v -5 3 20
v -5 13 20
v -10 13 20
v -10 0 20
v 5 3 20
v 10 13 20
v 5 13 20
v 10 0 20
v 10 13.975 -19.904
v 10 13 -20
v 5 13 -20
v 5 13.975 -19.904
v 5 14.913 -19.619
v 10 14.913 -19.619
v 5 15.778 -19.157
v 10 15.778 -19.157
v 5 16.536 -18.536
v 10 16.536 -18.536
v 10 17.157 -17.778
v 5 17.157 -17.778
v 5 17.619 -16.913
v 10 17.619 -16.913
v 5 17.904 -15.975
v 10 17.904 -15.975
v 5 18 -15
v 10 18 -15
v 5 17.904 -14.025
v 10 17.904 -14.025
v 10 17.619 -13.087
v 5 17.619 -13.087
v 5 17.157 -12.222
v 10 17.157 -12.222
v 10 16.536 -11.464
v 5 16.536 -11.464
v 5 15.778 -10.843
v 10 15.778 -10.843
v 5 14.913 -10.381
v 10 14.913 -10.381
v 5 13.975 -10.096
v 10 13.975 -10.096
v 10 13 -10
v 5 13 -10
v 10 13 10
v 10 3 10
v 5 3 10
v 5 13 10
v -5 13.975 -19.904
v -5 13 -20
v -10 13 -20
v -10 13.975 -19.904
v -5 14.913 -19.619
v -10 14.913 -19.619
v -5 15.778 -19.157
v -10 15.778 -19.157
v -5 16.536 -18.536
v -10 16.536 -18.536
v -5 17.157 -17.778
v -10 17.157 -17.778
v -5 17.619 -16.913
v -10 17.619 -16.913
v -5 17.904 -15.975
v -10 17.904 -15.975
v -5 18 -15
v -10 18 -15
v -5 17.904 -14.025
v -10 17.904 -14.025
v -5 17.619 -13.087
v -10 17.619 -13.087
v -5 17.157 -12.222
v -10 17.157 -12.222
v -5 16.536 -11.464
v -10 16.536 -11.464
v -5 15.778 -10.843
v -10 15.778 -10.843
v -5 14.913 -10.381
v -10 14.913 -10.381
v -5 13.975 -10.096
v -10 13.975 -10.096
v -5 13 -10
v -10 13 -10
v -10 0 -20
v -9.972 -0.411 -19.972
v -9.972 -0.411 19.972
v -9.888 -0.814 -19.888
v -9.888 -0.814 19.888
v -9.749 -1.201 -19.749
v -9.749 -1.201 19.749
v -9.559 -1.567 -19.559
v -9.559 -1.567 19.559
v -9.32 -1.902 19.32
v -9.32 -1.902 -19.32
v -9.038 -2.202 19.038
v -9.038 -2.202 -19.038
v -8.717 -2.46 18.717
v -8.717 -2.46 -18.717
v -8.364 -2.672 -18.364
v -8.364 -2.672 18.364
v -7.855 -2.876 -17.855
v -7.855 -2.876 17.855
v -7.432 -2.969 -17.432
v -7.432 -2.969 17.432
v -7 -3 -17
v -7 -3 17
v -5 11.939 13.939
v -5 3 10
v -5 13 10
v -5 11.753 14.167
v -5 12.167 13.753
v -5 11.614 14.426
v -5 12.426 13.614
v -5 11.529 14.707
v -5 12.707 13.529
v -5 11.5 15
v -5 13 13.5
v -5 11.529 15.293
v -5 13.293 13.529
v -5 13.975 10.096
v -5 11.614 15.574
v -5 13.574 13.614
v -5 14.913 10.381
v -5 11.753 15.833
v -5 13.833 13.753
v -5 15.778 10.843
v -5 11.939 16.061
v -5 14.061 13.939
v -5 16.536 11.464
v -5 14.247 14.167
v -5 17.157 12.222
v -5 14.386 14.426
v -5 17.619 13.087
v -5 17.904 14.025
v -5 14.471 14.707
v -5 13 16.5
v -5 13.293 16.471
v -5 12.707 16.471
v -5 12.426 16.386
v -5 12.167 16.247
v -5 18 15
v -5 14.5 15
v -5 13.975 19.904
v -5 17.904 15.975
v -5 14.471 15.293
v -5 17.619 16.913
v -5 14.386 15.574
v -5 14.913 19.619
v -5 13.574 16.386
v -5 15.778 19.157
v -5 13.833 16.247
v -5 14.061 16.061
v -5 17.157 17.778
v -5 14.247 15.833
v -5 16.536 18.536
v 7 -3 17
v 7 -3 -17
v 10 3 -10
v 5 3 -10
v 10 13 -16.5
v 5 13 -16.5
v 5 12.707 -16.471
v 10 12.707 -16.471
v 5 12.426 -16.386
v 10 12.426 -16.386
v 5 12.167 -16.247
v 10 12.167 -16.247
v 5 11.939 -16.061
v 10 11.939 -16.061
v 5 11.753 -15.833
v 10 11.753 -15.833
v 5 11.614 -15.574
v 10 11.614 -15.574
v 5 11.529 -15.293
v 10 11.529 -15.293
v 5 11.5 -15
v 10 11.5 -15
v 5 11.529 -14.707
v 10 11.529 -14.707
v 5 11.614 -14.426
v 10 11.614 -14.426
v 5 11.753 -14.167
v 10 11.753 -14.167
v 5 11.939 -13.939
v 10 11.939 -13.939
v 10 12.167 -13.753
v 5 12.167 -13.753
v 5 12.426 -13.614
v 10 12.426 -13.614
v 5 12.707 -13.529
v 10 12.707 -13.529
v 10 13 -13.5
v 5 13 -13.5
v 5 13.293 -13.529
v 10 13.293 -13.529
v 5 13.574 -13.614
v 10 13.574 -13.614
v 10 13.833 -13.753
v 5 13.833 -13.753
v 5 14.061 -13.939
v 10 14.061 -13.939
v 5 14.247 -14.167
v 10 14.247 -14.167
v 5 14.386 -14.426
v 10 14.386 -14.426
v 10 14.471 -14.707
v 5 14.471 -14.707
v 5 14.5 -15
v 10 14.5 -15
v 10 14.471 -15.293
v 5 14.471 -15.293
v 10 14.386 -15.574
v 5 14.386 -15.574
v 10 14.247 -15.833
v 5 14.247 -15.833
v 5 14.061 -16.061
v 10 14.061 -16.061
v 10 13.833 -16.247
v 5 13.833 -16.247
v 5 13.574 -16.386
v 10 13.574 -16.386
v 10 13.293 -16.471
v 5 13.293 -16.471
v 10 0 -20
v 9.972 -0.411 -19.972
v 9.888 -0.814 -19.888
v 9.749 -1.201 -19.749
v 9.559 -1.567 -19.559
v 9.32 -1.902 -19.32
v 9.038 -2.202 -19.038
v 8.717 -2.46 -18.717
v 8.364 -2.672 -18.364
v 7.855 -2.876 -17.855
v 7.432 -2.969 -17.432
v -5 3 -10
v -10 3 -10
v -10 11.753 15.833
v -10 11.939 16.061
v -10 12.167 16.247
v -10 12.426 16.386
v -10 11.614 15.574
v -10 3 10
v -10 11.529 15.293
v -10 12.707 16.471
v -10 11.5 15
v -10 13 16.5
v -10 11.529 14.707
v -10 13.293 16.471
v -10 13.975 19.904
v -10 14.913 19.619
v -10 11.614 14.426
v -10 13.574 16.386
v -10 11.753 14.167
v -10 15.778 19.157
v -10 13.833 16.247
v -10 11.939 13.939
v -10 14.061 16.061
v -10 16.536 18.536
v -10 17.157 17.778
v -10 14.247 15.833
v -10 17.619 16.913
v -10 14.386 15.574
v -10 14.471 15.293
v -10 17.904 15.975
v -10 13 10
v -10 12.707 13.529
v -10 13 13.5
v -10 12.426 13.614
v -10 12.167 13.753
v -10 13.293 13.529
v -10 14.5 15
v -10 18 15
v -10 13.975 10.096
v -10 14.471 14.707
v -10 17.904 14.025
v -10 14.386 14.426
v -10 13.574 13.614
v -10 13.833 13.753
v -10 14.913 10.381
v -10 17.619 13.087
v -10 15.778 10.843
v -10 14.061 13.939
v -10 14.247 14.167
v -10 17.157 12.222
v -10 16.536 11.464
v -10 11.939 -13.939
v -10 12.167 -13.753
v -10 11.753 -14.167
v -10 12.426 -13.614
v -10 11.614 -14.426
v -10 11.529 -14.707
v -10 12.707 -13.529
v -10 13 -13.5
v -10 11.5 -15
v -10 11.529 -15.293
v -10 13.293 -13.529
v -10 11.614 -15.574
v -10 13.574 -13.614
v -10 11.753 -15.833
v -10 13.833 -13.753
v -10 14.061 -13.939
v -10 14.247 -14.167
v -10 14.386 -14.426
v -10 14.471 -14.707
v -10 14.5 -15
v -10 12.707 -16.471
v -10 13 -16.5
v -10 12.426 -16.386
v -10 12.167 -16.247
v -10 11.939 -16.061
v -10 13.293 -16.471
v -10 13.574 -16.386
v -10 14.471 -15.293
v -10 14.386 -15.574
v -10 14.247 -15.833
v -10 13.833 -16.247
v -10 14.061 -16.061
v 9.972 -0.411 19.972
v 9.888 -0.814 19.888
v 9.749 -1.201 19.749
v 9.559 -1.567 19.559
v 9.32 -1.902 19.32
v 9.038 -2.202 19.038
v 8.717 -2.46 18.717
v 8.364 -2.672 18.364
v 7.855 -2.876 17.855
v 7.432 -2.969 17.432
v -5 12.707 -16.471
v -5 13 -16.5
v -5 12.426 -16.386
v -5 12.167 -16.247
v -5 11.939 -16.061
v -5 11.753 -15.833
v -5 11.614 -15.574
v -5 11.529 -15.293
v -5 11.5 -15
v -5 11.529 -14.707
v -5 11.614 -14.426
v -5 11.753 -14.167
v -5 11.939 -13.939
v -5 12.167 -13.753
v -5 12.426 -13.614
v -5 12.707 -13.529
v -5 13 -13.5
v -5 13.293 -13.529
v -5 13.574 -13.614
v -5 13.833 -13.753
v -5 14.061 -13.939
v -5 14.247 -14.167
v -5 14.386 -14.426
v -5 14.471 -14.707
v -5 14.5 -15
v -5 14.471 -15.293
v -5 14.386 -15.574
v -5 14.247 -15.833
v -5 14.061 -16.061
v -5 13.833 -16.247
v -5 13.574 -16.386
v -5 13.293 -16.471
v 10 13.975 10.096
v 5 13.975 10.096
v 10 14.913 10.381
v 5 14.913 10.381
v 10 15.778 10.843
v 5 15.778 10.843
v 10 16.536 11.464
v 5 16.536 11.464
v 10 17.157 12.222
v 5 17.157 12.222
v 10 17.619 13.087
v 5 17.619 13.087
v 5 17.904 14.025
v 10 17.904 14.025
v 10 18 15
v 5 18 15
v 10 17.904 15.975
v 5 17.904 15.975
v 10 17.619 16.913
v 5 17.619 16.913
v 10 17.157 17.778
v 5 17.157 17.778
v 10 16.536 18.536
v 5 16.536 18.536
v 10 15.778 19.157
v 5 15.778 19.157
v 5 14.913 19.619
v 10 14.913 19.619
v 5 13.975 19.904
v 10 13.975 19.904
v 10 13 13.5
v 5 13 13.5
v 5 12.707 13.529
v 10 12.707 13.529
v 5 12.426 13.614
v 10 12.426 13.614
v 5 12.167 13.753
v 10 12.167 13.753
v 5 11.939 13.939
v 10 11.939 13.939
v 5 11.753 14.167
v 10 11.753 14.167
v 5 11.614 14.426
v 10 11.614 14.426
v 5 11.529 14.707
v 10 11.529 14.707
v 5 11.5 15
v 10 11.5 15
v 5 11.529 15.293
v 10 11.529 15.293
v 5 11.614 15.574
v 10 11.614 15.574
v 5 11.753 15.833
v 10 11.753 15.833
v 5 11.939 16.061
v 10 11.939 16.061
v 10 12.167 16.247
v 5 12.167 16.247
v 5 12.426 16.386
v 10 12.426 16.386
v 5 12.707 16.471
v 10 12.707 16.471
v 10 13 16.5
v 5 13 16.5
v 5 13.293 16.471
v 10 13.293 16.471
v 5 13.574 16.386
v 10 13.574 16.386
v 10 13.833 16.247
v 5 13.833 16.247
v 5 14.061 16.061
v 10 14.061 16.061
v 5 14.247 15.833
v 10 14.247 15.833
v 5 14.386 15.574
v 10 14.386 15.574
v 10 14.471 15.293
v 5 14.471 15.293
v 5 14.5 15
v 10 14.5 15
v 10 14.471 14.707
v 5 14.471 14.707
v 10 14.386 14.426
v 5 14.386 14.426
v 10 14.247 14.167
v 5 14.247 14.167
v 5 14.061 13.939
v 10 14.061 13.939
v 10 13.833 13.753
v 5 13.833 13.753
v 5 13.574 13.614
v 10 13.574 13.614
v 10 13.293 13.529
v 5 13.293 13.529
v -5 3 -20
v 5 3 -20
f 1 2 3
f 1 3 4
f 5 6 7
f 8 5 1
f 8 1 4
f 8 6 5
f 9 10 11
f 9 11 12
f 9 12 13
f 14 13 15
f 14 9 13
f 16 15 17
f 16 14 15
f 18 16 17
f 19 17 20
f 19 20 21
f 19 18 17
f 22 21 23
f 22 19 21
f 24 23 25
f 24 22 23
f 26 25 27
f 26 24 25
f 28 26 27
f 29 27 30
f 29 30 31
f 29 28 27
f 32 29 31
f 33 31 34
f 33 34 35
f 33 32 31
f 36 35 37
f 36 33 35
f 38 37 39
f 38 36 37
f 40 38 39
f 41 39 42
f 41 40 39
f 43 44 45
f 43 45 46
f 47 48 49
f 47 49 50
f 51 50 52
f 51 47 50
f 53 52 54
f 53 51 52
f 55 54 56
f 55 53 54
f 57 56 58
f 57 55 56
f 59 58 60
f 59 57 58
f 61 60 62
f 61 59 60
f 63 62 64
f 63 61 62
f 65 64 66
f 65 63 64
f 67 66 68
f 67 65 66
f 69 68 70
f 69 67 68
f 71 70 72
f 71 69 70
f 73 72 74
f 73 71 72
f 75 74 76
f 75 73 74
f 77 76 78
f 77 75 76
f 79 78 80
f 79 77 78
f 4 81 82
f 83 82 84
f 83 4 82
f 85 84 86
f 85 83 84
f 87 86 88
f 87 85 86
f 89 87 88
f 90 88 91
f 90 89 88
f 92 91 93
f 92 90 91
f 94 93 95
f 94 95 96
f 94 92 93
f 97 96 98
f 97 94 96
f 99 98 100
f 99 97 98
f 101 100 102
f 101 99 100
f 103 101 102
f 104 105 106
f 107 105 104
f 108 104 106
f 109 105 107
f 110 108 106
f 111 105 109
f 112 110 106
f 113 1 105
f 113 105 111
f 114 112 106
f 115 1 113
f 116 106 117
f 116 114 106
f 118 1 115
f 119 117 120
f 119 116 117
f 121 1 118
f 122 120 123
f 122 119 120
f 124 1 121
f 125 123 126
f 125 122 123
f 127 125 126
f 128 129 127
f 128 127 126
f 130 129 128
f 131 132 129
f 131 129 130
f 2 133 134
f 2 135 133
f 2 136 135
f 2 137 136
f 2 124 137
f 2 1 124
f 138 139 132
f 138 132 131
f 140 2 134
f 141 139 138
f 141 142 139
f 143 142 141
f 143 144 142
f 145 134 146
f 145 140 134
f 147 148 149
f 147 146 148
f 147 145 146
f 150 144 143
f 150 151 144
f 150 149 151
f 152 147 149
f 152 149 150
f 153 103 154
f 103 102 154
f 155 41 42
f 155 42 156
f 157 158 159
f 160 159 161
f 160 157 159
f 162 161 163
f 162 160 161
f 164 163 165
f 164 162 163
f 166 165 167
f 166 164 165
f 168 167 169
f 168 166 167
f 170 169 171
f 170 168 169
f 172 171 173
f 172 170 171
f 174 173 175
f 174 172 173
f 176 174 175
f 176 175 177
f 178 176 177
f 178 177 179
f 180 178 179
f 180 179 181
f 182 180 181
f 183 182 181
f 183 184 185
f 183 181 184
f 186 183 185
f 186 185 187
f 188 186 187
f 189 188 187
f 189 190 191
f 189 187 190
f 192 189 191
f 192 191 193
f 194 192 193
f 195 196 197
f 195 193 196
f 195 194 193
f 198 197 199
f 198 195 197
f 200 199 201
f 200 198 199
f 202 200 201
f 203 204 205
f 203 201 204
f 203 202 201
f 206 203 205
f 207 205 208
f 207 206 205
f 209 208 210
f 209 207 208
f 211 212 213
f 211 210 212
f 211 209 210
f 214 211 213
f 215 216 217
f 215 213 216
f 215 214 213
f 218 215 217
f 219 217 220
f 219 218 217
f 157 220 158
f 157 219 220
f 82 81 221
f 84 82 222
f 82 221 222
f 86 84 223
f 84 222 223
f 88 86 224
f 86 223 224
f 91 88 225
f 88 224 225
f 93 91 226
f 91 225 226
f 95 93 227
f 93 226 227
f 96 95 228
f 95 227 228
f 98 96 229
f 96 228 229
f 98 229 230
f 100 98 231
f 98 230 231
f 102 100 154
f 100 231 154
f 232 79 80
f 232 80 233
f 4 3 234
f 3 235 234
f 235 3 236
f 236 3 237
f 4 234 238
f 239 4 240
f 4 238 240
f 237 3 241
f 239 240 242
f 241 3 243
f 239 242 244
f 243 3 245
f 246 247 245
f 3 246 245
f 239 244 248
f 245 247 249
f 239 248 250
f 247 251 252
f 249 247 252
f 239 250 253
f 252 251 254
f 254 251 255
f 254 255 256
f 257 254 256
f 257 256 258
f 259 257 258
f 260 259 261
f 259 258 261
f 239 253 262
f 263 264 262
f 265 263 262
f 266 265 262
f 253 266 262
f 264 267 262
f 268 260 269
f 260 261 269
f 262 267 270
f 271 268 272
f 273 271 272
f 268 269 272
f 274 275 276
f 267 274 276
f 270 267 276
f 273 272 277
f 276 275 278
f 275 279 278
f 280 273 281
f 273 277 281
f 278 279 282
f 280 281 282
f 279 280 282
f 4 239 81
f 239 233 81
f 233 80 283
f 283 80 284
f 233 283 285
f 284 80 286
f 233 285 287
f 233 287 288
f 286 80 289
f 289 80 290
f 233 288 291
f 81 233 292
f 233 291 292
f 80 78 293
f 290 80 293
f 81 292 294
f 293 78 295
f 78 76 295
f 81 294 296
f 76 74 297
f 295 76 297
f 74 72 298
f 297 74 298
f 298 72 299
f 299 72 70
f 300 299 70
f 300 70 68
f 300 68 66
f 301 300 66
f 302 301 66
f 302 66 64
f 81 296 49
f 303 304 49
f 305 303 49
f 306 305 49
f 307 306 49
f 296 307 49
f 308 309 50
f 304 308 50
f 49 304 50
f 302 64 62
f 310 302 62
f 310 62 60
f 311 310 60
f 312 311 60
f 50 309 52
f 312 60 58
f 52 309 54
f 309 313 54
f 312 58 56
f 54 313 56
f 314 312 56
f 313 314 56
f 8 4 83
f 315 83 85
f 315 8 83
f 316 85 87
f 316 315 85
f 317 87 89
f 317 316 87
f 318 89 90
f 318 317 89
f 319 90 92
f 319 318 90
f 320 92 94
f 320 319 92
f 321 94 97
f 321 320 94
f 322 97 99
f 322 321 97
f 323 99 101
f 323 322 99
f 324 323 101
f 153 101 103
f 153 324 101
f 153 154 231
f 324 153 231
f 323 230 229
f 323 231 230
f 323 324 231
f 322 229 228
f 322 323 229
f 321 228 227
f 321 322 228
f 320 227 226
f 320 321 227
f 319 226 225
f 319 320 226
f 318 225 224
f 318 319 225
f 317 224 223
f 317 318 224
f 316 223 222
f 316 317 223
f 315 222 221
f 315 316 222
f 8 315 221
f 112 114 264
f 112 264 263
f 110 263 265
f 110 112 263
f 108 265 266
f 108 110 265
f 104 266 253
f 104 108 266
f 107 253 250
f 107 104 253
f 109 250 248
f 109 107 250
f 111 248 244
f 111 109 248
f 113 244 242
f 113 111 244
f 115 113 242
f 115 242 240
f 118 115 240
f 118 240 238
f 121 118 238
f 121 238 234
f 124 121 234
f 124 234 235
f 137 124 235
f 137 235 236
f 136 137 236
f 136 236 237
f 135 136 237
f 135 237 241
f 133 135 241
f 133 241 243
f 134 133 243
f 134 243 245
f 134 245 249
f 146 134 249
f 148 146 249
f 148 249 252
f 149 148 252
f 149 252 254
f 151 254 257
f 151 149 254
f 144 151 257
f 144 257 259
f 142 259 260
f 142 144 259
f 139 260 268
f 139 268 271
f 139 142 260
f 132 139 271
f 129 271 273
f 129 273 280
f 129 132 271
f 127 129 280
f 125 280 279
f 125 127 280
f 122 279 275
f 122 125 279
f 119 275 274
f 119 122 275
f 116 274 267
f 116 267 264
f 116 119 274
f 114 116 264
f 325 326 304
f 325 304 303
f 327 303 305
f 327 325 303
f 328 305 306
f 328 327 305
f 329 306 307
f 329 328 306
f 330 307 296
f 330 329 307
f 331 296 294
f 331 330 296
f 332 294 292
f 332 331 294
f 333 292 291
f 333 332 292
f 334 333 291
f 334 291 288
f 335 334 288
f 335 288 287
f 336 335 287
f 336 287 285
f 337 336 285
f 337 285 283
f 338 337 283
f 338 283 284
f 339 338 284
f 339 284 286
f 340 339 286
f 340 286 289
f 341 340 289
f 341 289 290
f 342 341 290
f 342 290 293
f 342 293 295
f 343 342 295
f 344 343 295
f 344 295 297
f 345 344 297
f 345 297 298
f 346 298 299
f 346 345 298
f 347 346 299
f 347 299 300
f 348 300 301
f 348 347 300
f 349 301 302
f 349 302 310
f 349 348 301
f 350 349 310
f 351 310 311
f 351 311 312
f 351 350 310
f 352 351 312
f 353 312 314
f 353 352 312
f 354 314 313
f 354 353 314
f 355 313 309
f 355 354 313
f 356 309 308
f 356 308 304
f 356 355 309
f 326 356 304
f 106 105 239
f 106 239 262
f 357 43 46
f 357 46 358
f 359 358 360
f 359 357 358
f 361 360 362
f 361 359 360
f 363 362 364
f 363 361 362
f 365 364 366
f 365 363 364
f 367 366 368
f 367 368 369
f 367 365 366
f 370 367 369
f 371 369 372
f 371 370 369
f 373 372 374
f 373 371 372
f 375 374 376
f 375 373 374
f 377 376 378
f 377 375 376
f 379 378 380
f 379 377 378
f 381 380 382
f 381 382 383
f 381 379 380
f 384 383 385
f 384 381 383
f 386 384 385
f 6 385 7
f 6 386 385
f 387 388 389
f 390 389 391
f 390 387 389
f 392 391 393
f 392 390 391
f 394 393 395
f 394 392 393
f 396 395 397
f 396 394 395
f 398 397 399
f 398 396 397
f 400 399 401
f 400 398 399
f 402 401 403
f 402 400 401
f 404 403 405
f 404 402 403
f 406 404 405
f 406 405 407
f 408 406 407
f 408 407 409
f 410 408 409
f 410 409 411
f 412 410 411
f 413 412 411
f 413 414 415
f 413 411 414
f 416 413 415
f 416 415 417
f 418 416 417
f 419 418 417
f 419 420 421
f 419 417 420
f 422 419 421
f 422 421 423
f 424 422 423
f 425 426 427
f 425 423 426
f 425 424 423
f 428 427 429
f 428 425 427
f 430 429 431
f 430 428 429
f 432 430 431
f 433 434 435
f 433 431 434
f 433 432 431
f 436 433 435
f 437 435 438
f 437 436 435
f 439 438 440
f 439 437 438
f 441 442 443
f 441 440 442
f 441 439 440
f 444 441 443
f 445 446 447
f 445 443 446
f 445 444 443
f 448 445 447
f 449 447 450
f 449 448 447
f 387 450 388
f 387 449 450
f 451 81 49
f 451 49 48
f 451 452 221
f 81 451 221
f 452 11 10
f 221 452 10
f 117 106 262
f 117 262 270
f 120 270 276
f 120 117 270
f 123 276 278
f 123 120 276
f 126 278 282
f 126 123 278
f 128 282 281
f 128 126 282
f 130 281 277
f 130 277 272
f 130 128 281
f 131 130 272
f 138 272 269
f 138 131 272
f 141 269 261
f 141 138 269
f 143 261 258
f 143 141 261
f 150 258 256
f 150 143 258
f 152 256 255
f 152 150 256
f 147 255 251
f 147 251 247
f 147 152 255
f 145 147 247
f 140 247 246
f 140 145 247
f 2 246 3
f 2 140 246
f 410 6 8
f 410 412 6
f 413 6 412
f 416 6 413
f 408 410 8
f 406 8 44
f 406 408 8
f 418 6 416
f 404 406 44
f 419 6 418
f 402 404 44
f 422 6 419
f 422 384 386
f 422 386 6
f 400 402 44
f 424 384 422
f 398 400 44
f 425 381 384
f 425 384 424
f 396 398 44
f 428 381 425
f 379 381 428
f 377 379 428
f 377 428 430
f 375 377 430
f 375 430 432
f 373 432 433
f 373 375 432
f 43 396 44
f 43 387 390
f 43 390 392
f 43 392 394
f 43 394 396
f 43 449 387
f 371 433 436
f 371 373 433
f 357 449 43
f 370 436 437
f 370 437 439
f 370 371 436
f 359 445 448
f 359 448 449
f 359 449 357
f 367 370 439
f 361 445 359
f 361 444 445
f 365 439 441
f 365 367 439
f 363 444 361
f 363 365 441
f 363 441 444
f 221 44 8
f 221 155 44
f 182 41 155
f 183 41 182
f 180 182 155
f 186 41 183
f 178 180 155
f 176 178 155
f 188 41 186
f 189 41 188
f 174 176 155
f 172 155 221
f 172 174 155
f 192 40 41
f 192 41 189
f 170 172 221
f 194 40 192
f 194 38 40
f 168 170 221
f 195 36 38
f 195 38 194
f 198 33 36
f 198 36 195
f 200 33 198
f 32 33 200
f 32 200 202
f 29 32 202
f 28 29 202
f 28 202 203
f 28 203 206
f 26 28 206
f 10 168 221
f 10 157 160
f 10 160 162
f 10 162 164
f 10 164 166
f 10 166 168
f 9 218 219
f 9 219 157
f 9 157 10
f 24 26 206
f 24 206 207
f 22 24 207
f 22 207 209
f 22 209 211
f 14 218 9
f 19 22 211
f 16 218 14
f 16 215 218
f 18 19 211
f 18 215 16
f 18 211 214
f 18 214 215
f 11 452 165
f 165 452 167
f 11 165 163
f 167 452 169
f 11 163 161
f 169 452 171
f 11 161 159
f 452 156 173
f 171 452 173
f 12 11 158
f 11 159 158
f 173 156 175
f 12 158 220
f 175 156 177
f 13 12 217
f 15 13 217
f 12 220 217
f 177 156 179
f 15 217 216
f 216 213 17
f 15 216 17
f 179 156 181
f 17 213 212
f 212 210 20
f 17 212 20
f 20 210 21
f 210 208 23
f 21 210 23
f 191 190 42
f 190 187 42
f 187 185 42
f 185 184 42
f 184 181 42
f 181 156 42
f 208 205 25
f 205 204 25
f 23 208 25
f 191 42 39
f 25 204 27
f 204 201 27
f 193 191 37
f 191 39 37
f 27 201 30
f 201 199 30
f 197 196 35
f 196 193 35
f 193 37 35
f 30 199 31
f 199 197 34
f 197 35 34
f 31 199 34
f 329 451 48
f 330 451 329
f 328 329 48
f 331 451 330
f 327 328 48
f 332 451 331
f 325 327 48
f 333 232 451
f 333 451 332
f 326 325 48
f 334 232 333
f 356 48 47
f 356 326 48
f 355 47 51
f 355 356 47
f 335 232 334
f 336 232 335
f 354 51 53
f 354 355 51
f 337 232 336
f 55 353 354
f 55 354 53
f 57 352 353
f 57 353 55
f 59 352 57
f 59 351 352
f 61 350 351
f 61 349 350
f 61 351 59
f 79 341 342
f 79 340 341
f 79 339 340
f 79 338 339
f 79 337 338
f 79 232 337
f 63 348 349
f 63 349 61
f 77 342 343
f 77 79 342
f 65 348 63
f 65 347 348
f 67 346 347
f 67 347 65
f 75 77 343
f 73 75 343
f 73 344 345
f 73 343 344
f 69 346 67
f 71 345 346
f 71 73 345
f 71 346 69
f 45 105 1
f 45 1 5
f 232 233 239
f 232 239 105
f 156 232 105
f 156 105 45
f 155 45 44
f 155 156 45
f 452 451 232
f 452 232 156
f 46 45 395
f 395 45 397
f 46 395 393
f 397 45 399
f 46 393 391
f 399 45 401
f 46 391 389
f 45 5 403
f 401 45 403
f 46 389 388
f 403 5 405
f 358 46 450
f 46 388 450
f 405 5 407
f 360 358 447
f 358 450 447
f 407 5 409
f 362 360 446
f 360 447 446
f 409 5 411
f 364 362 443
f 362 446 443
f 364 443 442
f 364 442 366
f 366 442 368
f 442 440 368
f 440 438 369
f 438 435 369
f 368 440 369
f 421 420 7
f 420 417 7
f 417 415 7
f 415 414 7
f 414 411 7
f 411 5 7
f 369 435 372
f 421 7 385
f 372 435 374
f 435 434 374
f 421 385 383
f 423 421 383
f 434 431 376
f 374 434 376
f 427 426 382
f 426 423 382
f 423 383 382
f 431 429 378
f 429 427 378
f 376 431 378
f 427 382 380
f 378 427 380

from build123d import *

# Parameters (mm, degrees)
BOSS_EXTRUDE1_DEPTH      = 20
BOSS_EXTRUDE1_DEPTH_BACK = 20
SKETCH1_W                = 20
SKETCH1_H                = 6
SKETCH2_R                = 1.5
BOSS_EXTRUDE2_DEPTH      = 20
SKETCH3_W                = 10
SKETCH3_H                = 15
CUT_EXTRUDE1_DEPTH       = 40
FILLET2_R                = 3


with BuildPart() as part:
    # Sketch1 → Boss-Extrude1 (new, two sides: drawn at the far end of the back side and taken through both)
    with BuildSketch(Plane.XY.offset(-BOSS_EXTRUDE1_DEPTH_BACK)):
        Rectangle(SKETCH1_W, SKETCH1_H)
    extrude(amount=BOSS_EXTRUDE1_DEPTH + BOSS_EXTRUDE1_DEPTH_BACK)

    # Sketch2 → Boss-Extrude2 (add)
    # profile 1 of 2: a face of its own
    with BuildSketch(Plane(origin=(10, 0, 0), x_dir=(0, 0, -1), z_dir=(1, 0, 0))):
        with BuildLine():
            Line((-20, 13), (-20, 3))
            Line((-20, 3), (-10, 3))
            Line((-10, 3), (-10, 13))
            ThreePointArc((-10, 13), (-15, 18), (-20, 13))
        make_face()
        with Locations((-15, 13)):
            Circle(SKETCH2_R, mode=Mode.SUBTRACT)
    # profile 2 of 2: a face of its own
    with BuildSketch(Plane(origin=(10, 0, 0), x_dir=(0, 0, -1), z_dir=(1, 0, 0))):
        with BuildLine():
            Line((10, 13), (10, 3))
            Line((10, 3), (20, 3))
            Line((20, 3), (20, 13))
            ThreePointArc((20, 13), (15, 18), (10, 13))
        make_face()
        with Locations((15, 13)):
            Circle(SKETCH2_R, mode=Mode.SUBTRACT)
    extrude(amount=-BOSS_EXTRUDE2_DEPTH)

    # Sketch3 → Cut-Extrude1 (cut)
    with BuildSketch(Plane.XY.offset(20)):
        with Locations((0, 10.5)):
            Rectangle(SKETCH3_W, SKETCH3_H)
    extrude(amount=-CUT_EXTRUDE1_DEPTH, mode=Mode.SUBTRACT)

    # Fillet2
    fillet2_edges = [part.edges().sort_by_distance(p)[0] for p in [
        (0, -3, -20),
        (-10, -3, 0),
        (0, -3, 20),
        (10, -3, 0),
    ]]
    fillet(fillet2_edges, radius=FILLET2_R)


solid = part.part
